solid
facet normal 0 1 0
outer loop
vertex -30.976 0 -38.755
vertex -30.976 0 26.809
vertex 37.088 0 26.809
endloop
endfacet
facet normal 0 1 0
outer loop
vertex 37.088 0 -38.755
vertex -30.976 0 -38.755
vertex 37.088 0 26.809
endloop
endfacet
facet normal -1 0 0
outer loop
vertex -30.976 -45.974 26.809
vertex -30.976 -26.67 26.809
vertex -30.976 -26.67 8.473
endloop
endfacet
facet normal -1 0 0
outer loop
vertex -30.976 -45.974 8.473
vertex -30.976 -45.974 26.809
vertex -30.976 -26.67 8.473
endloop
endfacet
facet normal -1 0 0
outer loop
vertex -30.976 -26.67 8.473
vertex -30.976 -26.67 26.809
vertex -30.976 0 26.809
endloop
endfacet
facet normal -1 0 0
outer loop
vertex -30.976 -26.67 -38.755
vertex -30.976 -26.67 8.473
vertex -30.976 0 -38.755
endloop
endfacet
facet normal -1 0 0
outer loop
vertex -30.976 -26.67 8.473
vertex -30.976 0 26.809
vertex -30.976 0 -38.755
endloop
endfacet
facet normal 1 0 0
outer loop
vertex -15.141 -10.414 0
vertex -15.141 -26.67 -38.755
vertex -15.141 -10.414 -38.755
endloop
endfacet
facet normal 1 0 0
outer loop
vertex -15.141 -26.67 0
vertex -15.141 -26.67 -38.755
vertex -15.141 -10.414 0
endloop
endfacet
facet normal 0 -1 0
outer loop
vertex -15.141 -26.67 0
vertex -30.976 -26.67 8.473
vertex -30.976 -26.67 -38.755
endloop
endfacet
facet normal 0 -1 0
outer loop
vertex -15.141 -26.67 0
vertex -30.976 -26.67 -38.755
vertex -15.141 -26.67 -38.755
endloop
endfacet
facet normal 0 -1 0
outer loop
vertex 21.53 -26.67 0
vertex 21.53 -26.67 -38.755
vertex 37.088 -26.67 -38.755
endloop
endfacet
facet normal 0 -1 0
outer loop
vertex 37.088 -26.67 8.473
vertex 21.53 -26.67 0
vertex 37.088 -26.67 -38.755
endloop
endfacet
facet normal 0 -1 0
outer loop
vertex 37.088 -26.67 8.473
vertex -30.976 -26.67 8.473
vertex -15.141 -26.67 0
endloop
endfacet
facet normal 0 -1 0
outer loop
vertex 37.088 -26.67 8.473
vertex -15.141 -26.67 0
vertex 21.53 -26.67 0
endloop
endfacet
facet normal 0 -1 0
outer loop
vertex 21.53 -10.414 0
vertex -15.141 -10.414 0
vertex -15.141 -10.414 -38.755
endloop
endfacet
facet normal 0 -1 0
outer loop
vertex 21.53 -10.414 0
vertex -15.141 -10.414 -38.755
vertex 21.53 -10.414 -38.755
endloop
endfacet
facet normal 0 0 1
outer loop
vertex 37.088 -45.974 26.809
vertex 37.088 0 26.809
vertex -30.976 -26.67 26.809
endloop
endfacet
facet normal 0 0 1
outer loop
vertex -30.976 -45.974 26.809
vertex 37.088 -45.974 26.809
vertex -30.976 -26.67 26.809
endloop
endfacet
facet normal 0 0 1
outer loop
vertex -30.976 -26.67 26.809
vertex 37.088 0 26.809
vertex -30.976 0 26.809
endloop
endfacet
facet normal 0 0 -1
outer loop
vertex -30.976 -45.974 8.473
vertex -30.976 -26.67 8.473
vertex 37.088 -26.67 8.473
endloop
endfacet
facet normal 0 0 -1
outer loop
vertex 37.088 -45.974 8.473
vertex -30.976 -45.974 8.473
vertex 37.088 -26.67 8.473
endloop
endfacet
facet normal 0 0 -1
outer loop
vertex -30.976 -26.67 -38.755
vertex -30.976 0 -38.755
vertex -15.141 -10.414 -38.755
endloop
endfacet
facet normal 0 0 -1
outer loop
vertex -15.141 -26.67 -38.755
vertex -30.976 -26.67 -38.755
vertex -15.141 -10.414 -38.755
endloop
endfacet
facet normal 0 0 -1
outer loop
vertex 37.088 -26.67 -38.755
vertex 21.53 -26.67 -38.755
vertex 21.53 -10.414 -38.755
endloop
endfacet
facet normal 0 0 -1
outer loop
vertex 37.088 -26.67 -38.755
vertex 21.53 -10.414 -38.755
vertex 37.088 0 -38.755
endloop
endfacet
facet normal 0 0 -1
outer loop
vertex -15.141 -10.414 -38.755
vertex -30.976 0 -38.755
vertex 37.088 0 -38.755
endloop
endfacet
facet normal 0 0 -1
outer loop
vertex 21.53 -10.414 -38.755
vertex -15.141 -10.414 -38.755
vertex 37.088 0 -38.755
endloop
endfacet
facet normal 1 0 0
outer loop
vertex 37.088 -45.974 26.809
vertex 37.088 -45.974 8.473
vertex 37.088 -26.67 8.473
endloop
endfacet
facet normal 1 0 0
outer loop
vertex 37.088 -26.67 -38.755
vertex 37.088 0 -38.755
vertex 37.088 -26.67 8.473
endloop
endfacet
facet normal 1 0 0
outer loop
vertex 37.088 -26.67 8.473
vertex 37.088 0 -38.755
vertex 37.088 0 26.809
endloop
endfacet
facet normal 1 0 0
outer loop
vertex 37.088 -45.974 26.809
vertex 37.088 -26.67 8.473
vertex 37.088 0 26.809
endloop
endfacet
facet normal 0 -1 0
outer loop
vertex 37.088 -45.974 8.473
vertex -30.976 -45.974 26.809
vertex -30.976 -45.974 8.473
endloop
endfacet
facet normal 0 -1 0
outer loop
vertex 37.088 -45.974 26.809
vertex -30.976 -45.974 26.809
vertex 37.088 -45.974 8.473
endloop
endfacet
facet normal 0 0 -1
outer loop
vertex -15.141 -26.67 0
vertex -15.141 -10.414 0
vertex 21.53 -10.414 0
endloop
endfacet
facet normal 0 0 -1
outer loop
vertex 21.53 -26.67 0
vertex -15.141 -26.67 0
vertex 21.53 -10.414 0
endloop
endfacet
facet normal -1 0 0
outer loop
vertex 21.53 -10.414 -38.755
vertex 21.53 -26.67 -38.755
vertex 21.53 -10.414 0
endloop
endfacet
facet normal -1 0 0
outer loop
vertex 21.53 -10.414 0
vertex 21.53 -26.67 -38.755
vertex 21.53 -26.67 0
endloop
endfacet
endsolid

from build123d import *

# Parameters (mm, degrees)
F0_W     = 68.0640637875
F0_H     = 65.563749522
F1_DEPTH = 26.67
F2_W     = 36.6712510586
F2_H     = 47.2281239927
F3_DEPTH = 16.256
F5_DEPTH = 19.304
F6_W     = 36.6712510586
F6_H     = 8.4732808173
F7_DEPTH = 16.256


with BuildPart() as f1:
    # F0 (on Front) → F1 (new body)
    with BuildSketch(Plane.XZ):
        with Locations((3.0559375882, -5.9729684144)):
            Rectangle(F0_W, F0_H)
    extrude(amount=F1_DEPTH)

    # F2 (on face) → F3 (cut)
    with BuildSketch(Plane.XZ.offset(26.67)):
        with Locations((3.1948443502, -15.1407811791)):
            Rectangle(F2_W, F2_H)
    extrude(amount=-F3_DEPTH, mode=Mode.SUBTRACT)

    # F4 (on face) → F5 (join)
    with BuildSketch(Plane.XZ.offset(26.67)):
        Polygon((37.0879694819, 26.8089063466), (-30.9760943055, 26.8089063466), (-30.9760943055, 8.4732808173), (-15.1407811791, 8.4732808173), (21.5304698795, 8.4732808173), (37.0879694819, 8.4732808173), align=None)
    extrude(amount=F5_DEPTH)

    # F6 (on face) → F7 (join)
    with BuildSketch(Plane.XZ.offset(10.414)):
        with Locations((3.1948443502, 4.2366404086)):
            Rectangle(F6_W, F6_H)
    extrude(amount=F7_DEPTH)


solid = f1.part
